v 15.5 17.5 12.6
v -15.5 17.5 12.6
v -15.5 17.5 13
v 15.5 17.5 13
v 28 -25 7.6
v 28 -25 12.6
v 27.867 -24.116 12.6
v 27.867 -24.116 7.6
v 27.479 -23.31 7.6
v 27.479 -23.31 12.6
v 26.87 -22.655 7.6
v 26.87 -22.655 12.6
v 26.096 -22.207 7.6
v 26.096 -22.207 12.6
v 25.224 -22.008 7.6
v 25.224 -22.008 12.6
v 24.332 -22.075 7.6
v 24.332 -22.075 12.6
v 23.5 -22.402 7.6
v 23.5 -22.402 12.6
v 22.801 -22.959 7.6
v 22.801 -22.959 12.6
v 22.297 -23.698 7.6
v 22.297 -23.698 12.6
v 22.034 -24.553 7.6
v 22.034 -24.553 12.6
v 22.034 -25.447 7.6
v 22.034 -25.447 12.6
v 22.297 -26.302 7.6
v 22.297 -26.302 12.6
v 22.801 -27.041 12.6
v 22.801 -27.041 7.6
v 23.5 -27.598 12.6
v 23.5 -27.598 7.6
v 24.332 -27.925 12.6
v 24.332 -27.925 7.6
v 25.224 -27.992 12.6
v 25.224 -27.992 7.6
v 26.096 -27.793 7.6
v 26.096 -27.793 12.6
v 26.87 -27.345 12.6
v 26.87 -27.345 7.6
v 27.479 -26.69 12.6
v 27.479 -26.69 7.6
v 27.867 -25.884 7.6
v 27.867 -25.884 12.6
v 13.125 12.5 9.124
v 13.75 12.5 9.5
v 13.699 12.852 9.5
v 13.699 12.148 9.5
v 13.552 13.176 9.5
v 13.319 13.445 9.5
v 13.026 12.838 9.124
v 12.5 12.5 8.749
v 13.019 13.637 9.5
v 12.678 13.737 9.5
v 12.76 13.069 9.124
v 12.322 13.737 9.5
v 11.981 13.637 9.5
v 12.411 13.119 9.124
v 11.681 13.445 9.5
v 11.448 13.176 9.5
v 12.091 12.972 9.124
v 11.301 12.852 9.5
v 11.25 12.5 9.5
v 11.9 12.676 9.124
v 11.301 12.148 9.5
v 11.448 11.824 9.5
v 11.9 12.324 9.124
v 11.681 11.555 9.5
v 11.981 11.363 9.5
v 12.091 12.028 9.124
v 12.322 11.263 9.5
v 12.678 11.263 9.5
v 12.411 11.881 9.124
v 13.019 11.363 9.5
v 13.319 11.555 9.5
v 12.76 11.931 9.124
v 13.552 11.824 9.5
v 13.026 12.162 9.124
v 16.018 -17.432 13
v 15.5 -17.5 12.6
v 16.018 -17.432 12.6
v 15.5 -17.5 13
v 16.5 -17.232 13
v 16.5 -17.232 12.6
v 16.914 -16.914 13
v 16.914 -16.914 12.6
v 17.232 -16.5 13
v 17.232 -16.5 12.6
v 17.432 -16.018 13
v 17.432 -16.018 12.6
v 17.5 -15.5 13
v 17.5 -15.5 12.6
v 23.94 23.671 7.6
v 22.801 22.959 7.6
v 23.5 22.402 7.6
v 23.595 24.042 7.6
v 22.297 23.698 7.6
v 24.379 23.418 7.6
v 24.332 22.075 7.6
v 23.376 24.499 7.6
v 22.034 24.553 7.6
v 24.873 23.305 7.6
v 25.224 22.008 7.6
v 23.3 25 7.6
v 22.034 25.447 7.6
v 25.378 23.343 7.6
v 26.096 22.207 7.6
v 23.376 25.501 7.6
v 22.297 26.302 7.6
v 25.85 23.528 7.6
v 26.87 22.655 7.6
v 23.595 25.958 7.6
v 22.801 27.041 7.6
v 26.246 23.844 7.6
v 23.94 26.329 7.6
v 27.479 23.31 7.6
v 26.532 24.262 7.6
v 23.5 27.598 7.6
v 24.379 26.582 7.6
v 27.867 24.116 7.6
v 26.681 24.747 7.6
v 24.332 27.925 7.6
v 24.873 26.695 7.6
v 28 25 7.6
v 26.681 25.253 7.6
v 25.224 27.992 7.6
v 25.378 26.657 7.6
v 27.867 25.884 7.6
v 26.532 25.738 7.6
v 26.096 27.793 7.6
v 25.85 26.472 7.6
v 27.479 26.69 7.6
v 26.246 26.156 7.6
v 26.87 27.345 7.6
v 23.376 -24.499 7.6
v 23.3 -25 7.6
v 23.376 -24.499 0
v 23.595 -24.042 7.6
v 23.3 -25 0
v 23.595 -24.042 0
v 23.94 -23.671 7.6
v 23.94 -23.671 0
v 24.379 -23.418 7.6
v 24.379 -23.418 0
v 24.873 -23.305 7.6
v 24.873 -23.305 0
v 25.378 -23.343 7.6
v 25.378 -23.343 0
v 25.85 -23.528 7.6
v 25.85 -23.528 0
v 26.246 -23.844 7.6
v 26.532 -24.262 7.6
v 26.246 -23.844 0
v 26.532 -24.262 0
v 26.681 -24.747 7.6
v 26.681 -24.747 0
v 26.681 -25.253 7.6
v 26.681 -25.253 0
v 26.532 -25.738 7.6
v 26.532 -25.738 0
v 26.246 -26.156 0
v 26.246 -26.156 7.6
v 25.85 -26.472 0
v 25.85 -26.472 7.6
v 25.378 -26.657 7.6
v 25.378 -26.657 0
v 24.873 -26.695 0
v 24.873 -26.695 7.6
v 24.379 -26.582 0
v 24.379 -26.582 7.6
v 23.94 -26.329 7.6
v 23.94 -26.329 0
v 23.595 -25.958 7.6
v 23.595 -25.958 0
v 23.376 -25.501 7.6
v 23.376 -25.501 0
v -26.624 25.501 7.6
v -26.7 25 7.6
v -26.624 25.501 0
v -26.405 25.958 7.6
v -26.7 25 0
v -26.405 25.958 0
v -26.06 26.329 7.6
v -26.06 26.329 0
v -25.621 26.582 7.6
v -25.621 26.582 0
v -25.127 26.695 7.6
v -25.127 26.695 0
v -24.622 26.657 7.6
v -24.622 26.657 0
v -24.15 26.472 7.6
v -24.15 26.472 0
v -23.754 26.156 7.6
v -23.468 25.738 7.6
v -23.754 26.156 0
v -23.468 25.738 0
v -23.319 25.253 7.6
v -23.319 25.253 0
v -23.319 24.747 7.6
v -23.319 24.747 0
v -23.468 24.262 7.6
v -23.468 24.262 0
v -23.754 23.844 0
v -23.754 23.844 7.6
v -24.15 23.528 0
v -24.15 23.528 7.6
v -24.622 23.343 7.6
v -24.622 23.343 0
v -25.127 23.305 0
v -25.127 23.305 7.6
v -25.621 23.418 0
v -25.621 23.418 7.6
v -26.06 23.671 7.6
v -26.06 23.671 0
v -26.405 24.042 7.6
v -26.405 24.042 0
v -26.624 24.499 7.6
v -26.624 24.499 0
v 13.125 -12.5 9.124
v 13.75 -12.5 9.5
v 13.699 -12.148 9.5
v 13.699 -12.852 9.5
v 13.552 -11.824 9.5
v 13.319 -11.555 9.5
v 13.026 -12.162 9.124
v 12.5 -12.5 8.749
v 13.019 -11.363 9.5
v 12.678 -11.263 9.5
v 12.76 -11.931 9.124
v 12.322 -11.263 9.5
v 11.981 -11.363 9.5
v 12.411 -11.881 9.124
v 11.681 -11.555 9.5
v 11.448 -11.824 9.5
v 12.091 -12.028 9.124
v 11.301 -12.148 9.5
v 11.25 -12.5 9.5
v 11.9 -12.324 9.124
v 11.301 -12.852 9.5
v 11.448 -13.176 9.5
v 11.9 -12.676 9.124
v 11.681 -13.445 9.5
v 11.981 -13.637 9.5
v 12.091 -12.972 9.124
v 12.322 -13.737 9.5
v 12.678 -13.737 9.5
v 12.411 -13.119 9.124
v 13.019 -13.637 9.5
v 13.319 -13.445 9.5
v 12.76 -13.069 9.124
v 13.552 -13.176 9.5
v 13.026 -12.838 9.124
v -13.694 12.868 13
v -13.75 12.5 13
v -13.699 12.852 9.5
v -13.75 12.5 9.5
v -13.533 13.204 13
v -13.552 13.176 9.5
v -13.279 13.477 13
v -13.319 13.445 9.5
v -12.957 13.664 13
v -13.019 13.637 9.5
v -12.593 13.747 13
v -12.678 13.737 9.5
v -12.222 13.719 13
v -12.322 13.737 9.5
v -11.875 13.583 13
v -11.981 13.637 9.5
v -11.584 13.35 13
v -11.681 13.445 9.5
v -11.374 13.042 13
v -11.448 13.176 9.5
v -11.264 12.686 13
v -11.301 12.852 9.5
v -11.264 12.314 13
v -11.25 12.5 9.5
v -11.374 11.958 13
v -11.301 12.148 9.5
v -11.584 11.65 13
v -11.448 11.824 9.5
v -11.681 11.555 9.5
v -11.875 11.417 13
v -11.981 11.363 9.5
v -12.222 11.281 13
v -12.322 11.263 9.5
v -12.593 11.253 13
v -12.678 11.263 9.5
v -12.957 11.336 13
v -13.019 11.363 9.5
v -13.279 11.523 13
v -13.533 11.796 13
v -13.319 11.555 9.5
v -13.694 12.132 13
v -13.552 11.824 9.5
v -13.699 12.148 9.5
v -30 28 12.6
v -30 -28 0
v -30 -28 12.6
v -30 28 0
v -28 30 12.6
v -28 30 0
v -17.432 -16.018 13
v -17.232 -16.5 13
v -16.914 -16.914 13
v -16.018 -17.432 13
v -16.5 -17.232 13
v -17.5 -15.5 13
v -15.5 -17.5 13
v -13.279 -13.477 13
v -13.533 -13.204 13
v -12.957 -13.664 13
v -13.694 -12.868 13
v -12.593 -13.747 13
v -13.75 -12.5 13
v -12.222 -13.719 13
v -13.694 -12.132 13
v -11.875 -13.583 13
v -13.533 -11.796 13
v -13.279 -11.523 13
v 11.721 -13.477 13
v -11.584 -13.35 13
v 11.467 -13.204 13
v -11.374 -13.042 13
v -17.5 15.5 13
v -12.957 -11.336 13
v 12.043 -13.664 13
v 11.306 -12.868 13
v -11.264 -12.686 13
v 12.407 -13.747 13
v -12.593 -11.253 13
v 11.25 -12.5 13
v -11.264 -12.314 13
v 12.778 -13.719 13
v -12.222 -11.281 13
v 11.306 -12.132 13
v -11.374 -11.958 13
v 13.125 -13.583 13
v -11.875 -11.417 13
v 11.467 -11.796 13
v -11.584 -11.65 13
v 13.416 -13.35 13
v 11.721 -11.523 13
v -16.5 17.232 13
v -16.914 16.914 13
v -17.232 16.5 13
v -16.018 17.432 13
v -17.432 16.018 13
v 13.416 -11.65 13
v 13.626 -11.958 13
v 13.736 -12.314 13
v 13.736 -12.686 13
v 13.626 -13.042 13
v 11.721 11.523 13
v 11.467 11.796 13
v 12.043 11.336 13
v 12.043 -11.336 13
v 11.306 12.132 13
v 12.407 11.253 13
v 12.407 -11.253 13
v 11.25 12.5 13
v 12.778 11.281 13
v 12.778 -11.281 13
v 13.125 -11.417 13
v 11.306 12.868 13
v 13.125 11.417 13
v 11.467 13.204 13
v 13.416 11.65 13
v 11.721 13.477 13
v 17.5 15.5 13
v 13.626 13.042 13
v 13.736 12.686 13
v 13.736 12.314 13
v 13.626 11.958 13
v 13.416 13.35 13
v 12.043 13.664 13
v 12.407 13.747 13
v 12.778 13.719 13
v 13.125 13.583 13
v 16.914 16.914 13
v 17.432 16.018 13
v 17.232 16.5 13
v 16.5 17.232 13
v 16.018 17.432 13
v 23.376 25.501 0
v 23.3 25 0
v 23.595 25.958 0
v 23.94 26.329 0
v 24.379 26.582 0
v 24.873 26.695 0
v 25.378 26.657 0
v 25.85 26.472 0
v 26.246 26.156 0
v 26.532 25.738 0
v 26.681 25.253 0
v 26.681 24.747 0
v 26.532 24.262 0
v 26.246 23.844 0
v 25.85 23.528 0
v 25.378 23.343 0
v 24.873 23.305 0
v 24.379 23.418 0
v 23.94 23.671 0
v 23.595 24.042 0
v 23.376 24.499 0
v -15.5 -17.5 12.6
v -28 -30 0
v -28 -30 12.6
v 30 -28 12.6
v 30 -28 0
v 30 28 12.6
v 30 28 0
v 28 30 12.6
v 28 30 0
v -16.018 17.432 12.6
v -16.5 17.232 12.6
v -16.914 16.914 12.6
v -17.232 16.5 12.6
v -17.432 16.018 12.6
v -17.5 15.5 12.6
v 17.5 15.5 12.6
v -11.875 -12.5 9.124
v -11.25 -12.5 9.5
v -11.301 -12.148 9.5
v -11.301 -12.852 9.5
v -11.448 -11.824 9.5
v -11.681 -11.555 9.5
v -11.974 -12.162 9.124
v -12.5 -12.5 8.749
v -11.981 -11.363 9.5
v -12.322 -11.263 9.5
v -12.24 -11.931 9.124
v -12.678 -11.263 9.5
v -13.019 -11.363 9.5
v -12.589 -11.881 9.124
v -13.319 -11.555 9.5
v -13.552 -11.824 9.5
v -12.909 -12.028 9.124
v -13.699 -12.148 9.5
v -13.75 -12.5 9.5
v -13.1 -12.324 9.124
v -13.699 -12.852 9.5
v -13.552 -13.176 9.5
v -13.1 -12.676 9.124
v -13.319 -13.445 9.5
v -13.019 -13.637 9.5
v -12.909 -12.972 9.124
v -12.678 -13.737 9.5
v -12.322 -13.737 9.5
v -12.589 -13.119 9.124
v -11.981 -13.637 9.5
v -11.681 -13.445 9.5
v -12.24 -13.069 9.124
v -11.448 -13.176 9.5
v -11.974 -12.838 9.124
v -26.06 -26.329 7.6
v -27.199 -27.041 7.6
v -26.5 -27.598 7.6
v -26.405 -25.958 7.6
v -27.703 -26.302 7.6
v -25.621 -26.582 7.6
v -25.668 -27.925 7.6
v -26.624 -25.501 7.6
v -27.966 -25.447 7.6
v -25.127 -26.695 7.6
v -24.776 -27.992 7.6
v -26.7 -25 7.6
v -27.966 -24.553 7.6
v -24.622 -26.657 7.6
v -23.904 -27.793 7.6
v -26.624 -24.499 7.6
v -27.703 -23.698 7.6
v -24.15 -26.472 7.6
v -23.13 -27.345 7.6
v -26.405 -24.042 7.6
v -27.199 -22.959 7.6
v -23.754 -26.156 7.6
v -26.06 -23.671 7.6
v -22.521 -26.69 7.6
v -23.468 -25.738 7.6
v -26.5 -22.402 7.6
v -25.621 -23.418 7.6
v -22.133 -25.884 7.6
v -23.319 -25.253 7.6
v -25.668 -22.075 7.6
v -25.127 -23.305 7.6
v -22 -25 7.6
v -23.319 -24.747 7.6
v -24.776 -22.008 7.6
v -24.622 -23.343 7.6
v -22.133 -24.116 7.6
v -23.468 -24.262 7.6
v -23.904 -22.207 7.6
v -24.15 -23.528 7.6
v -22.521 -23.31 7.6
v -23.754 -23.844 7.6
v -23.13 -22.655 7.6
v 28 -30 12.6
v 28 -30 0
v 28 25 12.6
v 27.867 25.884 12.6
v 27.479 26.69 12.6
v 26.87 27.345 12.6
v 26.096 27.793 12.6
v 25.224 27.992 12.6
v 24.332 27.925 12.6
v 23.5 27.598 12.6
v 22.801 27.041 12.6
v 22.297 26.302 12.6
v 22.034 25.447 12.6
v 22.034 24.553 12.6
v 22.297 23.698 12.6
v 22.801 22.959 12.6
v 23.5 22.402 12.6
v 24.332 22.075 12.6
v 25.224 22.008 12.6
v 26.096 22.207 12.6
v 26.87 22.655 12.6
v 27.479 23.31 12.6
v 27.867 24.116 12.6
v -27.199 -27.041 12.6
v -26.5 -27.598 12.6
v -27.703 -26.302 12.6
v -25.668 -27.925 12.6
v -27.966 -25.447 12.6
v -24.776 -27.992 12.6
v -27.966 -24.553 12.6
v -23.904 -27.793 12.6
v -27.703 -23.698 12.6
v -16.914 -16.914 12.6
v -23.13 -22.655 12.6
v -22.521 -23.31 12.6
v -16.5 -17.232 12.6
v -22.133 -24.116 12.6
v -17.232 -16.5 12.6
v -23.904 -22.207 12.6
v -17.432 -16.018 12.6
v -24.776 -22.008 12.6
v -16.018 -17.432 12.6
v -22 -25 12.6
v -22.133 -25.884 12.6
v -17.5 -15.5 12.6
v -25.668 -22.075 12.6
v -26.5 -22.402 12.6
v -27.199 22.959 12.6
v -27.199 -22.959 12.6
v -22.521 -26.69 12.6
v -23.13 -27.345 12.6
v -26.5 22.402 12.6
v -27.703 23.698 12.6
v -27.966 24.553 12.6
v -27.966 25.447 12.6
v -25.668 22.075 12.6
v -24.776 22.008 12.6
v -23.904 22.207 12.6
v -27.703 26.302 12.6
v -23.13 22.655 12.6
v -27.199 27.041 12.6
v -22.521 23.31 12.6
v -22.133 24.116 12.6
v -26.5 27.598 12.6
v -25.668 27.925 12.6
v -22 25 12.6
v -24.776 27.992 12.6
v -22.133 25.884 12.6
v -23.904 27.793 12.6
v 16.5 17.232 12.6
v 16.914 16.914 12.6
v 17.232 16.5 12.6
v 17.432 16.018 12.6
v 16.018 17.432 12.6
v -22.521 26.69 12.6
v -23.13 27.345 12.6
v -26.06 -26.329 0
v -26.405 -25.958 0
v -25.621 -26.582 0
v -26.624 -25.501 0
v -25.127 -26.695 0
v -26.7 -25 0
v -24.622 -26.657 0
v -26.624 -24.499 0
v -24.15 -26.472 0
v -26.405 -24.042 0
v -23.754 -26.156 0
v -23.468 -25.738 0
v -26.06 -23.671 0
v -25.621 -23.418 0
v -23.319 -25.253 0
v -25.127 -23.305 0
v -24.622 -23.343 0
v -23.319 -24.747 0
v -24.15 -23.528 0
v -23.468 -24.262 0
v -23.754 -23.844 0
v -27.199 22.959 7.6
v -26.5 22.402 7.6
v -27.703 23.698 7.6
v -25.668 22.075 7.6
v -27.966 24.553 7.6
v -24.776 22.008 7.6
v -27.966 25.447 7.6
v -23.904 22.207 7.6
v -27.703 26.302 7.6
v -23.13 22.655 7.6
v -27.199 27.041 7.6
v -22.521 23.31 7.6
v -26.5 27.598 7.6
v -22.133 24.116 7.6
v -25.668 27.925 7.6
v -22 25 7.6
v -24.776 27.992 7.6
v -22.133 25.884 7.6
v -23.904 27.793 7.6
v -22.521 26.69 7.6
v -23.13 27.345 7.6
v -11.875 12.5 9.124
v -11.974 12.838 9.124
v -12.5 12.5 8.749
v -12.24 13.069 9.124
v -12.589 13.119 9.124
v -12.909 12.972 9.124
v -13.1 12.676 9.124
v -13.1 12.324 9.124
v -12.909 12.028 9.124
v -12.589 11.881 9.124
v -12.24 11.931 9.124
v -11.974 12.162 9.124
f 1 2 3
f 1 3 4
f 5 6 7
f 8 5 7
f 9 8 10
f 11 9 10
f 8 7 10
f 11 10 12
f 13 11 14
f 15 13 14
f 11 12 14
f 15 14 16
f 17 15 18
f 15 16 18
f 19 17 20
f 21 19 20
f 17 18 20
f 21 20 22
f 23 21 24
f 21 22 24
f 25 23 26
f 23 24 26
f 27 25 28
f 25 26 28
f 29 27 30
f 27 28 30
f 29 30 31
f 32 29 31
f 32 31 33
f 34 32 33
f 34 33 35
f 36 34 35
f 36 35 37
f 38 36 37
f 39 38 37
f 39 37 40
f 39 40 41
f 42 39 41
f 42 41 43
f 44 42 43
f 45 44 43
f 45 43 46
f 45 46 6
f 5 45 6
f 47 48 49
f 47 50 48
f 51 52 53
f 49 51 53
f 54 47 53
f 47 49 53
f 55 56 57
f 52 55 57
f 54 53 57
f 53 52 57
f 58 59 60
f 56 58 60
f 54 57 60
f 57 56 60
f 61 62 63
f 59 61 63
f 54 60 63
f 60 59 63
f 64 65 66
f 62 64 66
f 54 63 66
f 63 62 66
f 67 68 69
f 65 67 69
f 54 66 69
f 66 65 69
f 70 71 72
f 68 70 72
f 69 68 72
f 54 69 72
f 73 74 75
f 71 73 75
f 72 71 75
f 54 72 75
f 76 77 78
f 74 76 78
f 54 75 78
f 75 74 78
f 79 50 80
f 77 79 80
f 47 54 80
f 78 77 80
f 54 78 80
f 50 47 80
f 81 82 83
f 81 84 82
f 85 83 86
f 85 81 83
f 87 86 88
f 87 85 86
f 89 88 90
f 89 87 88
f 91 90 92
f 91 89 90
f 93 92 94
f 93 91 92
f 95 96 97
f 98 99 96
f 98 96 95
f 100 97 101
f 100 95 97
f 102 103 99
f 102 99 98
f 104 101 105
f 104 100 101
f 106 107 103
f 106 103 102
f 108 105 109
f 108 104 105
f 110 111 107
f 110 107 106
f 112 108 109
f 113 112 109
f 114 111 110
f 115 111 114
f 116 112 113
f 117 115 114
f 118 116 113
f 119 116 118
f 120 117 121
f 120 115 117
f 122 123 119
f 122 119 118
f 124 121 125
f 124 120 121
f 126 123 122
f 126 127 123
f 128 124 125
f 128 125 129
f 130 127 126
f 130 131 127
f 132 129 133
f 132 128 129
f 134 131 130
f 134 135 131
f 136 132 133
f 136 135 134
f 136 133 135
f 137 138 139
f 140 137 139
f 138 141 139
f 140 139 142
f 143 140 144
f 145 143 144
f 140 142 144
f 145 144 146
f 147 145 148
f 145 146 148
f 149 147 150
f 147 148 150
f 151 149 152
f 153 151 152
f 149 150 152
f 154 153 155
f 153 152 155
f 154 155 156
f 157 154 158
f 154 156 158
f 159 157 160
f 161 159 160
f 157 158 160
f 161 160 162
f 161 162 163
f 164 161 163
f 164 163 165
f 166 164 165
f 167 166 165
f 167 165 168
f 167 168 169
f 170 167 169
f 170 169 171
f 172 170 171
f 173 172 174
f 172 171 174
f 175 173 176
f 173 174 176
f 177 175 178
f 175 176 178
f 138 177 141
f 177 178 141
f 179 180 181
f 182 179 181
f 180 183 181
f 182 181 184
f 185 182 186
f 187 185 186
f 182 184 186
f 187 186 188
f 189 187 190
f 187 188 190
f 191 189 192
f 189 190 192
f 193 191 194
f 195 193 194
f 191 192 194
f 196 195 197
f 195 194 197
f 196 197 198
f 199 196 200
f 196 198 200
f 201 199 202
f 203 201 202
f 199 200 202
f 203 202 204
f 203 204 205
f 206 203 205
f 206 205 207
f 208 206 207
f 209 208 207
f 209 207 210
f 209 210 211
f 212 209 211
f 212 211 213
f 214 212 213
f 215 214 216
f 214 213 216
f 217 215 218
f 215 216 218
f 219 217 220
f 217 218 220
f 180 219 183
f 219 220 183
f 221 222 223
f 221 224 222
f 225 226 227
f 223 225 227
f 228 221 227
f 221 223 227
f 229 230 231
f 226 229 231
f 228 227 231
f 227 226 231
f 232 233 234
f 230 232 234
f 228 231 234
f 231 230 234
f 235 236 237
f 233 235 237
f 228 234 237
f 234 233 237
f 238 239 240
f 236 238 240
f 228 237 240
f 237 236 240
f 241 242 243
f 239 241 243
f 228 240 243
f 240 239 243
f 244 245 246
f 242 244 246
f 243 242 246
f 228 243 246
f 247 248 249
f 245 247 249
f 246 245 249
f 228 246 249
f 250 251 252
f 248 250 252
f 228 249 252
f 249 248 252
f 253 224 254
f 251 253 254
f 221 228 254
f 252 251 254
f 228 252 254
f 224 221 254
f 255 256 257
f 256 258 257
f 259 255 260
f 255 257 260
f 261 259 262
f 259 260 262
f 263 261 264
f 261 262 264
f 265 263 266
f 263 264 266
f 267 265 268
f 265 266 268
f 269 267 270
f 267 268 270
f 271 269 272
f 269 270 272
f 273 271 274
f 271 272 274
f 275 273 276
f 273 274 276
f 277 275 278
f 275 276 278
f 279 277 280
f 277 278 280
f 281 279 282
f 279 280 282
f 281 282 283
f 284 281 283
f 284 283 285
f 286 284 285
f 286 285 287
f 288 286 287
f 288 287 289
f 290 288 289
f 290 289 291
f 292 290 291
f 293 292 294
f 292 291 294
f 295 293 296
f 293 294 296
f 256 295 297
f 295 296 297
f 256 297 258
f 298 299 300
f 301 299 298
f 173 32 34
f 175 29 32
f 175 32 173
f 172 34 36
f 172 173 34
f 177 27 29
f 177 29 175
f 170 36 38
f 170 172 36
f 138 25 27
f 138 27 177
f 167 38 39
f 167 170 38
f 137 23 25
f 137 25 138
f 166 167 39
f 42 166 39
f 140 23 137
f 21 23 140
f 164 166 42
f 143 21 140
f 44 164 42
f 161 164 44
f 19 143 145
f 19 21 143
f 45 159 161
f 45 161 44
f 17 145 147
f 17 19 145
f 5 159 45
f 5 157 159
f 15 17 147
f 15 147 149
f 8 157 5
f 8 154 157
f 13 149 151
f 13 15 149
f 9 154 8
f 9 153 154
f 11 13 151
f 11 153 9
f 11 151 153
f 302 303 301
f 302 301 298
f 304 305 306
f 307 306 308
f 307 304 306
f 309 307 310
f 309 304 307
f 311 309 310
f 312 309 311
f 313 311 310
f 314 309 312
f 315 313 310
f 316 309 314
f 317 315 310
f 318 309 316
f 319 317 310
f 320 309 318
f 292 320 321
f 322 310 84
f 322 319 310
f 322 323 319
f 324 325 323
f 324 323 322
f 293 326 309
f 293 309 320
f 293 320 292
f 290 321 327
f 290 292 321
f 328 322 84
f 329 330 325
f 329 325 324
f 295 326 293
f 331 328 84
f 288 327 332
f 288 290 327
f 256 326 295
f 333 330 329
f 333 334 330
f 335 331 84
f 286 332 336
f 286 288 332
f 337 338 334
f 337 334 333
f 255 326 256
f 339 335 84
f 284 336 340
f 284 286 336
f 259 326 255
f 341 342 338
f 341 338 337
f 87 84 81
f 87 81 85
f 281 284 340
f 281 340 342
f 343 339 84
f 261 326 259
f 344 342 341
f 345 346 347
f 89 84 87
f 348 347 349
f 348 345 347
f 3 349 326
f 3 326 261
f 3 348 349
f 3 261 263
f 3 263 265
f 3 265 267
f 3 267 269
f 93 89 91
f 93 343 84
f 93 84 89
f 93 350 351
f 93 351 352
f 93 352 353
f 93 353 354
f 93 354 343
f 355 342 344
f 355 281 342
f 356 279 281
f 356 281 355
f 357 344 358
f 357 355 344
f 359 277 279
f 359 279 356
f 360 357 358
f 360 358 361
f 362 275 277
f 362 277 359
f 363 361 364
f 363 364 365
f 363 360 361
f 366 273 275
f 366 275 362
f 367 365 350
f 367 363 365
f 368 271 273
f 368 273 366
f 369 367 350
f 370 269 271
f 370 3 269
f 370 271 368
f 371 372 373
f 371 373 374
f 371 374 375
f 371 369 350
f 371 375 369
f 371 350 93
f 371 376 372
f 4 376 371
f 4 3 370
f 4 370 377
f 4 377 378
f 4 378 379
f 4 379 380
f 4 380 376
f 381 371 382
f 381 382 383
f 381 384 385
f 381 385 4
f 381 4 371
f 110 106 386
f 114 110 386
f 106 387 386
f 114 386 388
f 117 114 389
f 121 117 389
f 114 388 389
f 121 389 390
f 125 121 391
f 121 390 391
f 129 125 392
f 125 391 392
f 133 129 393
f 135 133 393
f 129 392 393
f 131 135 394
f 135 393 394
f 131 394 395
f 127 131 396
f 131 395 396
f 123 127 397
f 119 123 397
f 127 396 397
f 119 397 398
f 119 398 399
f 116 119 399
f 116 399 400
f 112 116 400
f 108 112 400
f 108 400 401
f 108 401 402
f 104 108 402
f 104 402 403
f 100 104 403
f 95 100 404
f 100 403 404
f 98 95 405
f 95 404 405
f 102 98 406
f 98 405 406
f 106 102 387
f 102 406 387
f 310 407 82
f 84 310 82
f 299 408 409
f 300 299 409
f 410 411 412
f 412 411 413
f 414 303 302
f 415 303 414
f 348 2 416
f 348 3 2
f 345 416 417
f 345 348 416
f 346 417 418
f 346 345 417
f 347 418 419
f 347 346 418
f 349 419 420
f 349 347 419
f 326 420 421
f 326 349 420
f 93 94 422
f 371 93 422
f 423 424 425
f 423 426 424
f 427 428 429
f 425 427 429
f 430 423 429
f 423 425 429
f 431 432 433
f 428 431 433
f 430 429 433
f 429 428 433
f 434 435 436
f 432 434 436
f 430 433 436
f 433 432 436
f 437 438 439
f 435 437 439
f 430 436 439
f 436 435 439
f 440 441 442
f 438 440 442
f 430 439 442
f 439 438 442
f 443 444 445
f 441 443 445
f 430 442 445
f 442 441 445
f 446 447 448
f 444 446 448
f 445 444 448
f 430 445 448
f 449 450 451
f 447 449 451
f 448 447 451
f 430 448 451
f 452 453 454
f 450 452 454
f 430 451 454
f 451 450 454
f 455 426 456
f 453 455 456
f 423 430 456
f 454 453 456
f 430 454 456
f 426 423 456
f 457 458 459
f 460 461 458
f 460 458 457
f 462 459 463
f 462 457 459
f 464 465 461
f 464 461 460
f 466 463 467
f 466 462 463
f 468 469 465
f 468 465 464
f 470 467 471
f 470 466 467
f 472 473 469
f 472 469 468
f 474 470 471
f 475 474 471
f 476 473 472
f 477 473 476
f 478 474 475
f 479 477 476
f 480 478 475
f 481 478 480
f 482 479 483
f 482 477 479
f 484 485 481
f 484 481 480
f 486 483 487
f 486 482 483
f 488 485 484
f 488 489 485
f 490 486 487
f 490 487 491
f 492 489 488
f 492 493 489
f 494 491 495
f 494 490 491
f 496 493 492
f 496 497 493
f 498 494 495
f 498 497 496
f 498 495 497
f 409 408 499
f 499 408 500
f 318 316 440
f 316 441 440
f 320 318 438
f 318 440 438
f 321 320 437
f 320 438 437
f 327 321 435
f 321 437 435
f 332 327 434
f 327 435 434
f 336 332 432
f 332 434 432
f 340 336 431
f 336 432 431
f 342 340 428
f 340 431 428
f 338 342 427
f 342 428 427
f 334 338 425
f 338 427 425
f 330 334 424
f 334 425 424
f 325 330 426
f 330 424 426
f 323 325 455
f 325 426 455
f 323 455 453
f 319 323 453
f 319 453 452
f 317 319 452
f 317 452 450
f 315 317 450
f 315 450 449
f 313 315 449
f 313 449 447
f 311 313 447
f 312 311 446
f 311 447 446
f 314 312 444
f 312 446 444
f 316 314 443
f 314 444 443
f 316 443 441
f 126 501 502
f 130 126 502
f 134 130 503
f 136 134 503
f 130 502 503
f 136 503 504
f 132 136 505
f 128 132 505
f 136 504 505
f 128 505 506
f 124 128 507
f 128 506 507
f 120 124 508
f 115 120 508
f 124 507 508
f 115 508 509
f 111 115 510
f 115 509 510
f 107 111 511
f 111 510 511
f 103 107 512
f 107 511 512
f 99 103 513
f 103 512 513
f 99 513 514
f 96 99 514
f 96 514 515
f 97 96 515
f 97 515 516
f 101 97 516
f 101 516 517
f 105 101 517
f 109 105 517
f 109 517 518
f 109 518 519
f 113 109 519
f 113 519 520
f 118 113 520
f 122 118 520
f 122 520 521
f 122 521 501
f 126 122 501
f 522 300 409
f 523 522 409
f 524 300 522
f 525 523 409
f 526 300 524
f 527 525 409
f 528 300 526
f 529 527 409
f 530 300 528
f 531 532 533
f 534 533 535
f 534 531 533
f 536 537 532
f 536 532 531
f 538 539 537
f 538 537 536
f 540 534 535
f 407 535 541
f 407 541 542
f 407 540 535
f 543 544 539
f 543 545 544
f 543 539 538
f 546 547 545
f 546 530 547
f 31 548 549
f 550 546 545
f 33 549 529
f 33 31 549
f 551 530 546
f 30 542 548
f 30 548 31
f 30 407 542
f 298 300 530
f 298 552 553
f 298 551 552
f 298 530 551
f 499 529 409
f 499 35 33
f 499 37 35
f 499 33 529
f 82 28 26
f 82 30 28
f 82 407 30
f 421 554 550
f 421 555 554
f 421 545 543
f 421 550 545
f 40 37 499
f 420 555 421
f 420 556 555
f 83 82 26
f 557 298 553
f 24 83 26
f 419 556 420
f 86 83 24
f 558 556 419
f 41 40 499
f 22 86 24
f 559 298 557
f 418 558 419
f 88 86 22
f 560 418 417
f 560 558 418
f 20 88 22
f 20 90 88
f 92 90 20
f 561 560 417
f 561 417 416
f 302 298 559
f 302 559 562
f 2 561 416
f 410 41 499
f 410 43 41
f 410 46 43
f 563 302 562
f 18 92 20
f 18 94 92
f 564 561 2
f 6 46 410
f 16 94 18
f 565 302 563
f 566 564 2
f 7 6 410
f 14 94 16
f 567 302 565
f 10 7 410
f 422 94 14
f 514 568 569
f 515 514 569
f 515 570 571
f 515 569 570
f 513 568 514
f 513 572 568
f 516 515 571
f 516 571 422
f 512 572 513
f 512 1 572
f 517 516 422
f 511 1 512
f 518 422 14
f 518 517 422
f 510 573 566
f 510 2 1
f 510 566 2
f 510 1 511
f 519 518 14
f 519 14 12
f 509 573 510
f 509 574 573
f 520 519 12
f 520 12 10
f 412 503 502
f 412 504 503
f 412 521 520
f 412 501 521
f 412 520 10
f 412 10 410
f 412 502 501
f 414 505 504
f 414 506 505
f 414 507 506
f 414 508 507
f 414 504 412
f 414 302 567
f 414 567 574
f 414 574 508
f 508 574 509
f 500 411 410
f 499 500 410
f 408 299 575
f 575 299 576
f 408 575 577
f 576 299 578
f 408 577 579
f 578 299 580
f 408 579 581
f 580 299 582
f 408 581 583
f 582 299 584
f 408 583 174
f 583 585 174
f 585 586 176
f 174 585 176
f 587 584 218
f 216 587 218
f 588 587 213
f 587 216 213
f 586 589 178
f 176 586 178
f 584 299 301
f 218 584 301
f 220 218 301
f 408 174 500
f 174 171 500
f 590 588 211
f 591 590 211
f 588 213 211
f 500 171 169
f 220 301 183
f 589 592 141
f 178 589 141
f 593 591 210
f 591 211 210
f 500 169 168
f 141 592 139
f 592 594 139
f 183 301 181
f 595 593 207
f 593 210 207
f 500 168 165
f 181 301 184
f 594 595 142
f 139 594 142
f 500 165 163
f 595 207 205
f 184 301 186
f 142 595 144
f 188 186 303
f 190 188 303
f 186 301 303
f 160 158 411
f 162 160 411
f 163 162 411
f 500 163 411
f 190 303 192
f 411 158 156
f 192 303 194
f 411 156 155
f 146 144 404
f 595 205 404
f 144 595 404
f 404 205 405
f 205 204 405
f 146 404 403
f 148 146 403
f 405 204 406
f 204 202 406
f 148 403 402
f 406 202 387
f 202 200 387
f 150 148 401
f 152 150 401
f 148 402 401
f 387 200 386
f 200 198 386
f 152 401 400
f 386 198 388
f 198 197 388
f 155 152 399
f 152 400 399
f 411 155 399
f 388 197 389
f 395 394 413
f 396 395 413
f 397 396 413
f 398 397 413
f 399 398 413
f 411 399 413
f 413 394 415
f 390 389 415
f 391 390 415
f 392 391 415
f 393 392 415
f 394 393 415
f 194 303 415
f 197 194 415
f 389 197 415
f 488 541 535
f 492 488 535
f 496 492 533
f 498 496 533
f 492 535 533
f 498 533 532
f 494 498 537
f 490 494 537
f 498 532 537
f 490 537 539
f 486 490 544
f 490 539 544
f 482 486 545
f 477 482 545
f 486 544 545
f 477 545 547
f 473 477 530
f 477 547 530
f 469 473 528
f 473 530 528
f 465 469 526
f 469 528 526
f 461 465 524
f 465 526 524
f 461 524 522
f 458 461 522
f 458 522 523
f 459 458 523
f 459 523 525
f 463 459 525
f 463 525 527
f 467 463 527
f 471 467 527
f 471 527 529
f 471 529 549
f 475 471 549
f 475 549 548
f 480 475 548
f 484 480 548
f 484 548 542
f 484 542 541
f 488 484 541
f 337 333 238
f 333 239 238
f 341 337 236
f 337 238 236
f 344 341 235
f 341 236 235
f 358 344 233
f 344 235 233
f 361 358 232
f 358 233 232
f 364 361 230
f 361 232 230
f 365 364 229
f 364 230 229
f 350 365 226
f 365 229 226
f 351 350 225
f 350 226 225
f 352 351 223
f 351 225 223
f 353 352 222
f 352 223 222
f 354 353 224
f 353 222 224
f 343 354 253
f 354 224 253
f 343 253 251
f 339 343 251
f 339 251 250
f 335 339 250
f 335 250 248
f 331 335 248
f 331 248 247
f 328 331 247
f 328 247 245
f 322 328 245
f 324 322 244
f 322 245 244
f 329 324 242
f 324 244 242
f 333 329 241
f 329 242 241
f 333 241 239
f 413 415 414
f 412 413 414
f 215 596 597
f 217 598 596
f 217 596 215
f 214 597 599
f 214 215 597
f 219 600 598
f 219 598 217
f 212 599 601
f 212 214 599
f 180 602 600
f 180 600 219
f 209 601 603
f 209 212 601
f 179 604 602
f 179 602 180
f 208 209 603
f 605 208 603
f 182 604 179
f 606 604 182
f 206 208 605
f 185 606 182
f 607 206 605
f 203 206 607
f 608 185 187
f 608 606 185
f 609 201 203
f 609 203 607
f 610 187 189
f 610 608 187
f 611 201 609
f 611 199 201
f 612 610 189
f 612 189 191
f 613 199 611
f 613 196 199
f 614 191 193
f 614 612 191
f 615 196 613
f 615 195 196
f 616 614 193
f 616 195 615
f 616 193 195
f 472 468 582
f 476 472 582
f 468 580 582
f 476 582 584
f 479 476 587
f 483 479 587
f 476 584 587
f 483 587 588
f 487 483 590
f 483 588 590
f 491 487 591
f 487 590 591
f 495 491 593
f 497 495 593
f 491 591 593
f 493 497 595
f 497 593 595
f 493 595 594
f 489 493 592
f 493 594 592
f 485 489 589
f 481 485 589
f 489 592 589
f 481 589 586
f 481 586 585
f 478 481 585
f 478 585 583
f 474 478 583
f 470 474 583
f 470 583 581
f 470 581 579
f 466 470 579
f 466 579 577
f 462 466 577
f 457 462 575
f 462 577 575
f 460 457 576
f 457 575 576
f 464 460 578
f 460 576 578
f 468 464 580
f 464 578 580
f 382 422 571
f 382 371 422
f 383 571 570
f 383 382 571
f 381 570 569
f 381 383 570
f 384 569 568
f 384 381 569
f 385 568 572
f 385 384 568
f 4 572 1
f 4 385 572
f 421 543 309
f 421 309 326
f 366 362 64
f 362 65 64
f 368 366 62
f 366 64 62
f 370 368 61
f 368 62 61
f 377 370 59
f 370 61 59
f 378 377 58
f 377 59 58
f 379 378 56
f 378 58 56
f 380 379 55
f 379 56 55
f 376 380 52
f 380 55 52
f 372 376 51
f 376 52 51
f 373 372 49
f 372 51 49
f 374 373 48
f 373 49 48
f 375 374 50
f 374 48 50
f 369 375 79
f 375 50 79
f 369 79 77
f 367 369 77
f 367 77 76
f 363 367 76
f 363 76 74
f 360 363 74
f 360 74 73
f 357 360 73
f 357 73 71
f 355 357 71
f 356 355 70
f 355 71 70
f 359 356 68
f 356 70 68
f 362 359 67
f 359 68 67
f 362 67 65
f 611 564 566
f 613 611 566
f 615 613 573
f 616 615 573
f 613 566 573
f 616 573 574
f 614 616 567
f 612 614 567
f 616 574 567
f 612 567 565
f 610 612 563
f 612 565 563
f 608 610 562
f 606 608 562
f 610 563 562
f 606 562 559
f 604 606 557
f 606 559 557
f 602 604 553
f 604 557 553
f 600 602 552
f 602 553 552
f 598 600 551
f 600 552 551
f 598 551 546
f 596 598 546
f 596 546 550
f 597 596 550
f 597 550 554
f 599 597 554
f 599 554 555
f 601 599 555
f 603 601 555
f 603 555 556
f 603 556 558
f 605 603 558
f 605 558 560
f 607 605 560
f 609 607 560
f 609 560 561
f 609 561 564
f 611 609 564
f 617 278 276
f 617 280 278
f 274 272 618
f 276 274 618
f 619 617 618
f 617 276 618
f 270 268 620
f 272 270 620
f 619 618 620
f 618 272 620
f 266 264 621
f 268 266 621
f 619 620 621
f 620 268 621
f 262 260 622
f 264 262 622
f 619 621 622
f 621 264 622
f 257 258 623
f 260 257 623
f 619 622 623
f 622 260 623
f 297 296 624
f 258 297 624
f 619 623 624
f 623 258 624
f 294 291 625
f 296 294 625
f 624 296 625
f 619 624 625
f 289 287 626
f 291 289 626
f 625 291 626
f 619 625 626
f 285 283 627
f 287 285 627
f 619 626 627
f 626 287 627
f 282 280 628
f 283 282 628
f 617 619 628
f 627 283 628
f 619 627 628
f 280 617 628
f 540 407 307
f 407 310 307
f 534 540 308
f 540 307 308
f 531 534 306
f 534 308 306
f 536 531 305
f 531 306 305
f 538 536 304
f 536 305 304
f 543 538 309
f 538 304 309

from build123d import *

# Parameters (mm, degrees)
SKETCH_1_W                = 60
SKETCH_1_H                = 60
EXTRUDE_1_DEPTH           = 12.6
CHAMFER_1_SIZE            = 2
SKETCH_2_W                = 35
SKETCH_2_H                = 35
EXTRUDE_2_DEPTH           = 0.4
FILLET_1_R                = 2
HOLE_WIZARD_1_D           = 3.4
HOLE_WIZARD_1_CBORE_D     = 6
HOLE_WIZARD_1_CBORE_DEPTH = 5
HOLE_WIZARD_M3_1_D        = 2.5
HOLE_WIZARD_M3_1_DEPTH    = 3.5
HOLE_WIZARD_M3_1_TIP      = 0.751075774


with BuildPart() as part:
    # 草图1 → 凸台-拉伸1 (new body)
    with BuildSketch(Plane.XY):
        Rectangle(SKETCH_1_W, SKETCH_1_H)
    extrude(amount=EXTRUDE_1_DEPTH)

    # 倒角1
    chamfer_1_edges = [part.edges().sort_by_distance(p)[0] for p in [
        (30, -30, 6.3),
        (-30, -30, 6.3),
        (-30, 30, 6.3),
        (30, 30, 6.3),
    ]]
    chamfer(chamfer_1_edges, length=CHAMFER_1_SIZE)

    # 草图2 → 凸台-拉伸2 (add)
    with BuildSketch(Plane.XY.offset(12.6)):
        Rectangle(SKETCH_2_W, SKETCH_2_H)
    extrude(amount=EXTRUDE_2_DEPTH)

    # 圆角1
    fillet_1_edges = [part.edges().sort_by_distance(p)[0] for p in [
        (17.5, -17.5, 12.8),
        (17.5, 17.5, 12.8),
        (-17.5, 17.5, 12.8),
        (-17.5, -17.5, 12.8),
    ]]
    fillet(fillet_1_edges, radius=FILLET_1_R)

    # 孔1 (through all)
    with Locations(Plane(origin=(-25, 25, 12.6), x_dir=(1, 0, 0), z_dir=(0, 0, 1))):
        with Locations((0, 0), (50, 0), (0, -50), (50, -50)):
            CounterBoreHole(HOLE_WIZARD_1_D / 2, HOLE_WIZARD_1_CBORE_D / 2, HOLE_WIZARD_1_CBORE_DEPTH)

    # M3 螺纹孔1
    with Locations(Plane(origin=(-12.5, 12.5, 13), x_dir=(1, 0, 0), z_dir=(0, 0, 1))):
        with Locations((0, 0), (25, 0), (25, -25), (0, -25)):
            Hole(HOLE_WIZARD_M3_1_D / 2, depth=HOLE_WIZARD_M3_1_DEPTH)
            with Locations((0, 0, -(HOLE_WIZARD_M3_1_DEPTH + HOLE_WIZARD_M3_1_TIP / 2))):  # 118° drill point
                Cone(0, HOLE_WIZARD_M3_1_D / 2, HOLE_WIZARD_M3_1_TIP, mode=Mode.SUBTRACT)


solid = part.part
